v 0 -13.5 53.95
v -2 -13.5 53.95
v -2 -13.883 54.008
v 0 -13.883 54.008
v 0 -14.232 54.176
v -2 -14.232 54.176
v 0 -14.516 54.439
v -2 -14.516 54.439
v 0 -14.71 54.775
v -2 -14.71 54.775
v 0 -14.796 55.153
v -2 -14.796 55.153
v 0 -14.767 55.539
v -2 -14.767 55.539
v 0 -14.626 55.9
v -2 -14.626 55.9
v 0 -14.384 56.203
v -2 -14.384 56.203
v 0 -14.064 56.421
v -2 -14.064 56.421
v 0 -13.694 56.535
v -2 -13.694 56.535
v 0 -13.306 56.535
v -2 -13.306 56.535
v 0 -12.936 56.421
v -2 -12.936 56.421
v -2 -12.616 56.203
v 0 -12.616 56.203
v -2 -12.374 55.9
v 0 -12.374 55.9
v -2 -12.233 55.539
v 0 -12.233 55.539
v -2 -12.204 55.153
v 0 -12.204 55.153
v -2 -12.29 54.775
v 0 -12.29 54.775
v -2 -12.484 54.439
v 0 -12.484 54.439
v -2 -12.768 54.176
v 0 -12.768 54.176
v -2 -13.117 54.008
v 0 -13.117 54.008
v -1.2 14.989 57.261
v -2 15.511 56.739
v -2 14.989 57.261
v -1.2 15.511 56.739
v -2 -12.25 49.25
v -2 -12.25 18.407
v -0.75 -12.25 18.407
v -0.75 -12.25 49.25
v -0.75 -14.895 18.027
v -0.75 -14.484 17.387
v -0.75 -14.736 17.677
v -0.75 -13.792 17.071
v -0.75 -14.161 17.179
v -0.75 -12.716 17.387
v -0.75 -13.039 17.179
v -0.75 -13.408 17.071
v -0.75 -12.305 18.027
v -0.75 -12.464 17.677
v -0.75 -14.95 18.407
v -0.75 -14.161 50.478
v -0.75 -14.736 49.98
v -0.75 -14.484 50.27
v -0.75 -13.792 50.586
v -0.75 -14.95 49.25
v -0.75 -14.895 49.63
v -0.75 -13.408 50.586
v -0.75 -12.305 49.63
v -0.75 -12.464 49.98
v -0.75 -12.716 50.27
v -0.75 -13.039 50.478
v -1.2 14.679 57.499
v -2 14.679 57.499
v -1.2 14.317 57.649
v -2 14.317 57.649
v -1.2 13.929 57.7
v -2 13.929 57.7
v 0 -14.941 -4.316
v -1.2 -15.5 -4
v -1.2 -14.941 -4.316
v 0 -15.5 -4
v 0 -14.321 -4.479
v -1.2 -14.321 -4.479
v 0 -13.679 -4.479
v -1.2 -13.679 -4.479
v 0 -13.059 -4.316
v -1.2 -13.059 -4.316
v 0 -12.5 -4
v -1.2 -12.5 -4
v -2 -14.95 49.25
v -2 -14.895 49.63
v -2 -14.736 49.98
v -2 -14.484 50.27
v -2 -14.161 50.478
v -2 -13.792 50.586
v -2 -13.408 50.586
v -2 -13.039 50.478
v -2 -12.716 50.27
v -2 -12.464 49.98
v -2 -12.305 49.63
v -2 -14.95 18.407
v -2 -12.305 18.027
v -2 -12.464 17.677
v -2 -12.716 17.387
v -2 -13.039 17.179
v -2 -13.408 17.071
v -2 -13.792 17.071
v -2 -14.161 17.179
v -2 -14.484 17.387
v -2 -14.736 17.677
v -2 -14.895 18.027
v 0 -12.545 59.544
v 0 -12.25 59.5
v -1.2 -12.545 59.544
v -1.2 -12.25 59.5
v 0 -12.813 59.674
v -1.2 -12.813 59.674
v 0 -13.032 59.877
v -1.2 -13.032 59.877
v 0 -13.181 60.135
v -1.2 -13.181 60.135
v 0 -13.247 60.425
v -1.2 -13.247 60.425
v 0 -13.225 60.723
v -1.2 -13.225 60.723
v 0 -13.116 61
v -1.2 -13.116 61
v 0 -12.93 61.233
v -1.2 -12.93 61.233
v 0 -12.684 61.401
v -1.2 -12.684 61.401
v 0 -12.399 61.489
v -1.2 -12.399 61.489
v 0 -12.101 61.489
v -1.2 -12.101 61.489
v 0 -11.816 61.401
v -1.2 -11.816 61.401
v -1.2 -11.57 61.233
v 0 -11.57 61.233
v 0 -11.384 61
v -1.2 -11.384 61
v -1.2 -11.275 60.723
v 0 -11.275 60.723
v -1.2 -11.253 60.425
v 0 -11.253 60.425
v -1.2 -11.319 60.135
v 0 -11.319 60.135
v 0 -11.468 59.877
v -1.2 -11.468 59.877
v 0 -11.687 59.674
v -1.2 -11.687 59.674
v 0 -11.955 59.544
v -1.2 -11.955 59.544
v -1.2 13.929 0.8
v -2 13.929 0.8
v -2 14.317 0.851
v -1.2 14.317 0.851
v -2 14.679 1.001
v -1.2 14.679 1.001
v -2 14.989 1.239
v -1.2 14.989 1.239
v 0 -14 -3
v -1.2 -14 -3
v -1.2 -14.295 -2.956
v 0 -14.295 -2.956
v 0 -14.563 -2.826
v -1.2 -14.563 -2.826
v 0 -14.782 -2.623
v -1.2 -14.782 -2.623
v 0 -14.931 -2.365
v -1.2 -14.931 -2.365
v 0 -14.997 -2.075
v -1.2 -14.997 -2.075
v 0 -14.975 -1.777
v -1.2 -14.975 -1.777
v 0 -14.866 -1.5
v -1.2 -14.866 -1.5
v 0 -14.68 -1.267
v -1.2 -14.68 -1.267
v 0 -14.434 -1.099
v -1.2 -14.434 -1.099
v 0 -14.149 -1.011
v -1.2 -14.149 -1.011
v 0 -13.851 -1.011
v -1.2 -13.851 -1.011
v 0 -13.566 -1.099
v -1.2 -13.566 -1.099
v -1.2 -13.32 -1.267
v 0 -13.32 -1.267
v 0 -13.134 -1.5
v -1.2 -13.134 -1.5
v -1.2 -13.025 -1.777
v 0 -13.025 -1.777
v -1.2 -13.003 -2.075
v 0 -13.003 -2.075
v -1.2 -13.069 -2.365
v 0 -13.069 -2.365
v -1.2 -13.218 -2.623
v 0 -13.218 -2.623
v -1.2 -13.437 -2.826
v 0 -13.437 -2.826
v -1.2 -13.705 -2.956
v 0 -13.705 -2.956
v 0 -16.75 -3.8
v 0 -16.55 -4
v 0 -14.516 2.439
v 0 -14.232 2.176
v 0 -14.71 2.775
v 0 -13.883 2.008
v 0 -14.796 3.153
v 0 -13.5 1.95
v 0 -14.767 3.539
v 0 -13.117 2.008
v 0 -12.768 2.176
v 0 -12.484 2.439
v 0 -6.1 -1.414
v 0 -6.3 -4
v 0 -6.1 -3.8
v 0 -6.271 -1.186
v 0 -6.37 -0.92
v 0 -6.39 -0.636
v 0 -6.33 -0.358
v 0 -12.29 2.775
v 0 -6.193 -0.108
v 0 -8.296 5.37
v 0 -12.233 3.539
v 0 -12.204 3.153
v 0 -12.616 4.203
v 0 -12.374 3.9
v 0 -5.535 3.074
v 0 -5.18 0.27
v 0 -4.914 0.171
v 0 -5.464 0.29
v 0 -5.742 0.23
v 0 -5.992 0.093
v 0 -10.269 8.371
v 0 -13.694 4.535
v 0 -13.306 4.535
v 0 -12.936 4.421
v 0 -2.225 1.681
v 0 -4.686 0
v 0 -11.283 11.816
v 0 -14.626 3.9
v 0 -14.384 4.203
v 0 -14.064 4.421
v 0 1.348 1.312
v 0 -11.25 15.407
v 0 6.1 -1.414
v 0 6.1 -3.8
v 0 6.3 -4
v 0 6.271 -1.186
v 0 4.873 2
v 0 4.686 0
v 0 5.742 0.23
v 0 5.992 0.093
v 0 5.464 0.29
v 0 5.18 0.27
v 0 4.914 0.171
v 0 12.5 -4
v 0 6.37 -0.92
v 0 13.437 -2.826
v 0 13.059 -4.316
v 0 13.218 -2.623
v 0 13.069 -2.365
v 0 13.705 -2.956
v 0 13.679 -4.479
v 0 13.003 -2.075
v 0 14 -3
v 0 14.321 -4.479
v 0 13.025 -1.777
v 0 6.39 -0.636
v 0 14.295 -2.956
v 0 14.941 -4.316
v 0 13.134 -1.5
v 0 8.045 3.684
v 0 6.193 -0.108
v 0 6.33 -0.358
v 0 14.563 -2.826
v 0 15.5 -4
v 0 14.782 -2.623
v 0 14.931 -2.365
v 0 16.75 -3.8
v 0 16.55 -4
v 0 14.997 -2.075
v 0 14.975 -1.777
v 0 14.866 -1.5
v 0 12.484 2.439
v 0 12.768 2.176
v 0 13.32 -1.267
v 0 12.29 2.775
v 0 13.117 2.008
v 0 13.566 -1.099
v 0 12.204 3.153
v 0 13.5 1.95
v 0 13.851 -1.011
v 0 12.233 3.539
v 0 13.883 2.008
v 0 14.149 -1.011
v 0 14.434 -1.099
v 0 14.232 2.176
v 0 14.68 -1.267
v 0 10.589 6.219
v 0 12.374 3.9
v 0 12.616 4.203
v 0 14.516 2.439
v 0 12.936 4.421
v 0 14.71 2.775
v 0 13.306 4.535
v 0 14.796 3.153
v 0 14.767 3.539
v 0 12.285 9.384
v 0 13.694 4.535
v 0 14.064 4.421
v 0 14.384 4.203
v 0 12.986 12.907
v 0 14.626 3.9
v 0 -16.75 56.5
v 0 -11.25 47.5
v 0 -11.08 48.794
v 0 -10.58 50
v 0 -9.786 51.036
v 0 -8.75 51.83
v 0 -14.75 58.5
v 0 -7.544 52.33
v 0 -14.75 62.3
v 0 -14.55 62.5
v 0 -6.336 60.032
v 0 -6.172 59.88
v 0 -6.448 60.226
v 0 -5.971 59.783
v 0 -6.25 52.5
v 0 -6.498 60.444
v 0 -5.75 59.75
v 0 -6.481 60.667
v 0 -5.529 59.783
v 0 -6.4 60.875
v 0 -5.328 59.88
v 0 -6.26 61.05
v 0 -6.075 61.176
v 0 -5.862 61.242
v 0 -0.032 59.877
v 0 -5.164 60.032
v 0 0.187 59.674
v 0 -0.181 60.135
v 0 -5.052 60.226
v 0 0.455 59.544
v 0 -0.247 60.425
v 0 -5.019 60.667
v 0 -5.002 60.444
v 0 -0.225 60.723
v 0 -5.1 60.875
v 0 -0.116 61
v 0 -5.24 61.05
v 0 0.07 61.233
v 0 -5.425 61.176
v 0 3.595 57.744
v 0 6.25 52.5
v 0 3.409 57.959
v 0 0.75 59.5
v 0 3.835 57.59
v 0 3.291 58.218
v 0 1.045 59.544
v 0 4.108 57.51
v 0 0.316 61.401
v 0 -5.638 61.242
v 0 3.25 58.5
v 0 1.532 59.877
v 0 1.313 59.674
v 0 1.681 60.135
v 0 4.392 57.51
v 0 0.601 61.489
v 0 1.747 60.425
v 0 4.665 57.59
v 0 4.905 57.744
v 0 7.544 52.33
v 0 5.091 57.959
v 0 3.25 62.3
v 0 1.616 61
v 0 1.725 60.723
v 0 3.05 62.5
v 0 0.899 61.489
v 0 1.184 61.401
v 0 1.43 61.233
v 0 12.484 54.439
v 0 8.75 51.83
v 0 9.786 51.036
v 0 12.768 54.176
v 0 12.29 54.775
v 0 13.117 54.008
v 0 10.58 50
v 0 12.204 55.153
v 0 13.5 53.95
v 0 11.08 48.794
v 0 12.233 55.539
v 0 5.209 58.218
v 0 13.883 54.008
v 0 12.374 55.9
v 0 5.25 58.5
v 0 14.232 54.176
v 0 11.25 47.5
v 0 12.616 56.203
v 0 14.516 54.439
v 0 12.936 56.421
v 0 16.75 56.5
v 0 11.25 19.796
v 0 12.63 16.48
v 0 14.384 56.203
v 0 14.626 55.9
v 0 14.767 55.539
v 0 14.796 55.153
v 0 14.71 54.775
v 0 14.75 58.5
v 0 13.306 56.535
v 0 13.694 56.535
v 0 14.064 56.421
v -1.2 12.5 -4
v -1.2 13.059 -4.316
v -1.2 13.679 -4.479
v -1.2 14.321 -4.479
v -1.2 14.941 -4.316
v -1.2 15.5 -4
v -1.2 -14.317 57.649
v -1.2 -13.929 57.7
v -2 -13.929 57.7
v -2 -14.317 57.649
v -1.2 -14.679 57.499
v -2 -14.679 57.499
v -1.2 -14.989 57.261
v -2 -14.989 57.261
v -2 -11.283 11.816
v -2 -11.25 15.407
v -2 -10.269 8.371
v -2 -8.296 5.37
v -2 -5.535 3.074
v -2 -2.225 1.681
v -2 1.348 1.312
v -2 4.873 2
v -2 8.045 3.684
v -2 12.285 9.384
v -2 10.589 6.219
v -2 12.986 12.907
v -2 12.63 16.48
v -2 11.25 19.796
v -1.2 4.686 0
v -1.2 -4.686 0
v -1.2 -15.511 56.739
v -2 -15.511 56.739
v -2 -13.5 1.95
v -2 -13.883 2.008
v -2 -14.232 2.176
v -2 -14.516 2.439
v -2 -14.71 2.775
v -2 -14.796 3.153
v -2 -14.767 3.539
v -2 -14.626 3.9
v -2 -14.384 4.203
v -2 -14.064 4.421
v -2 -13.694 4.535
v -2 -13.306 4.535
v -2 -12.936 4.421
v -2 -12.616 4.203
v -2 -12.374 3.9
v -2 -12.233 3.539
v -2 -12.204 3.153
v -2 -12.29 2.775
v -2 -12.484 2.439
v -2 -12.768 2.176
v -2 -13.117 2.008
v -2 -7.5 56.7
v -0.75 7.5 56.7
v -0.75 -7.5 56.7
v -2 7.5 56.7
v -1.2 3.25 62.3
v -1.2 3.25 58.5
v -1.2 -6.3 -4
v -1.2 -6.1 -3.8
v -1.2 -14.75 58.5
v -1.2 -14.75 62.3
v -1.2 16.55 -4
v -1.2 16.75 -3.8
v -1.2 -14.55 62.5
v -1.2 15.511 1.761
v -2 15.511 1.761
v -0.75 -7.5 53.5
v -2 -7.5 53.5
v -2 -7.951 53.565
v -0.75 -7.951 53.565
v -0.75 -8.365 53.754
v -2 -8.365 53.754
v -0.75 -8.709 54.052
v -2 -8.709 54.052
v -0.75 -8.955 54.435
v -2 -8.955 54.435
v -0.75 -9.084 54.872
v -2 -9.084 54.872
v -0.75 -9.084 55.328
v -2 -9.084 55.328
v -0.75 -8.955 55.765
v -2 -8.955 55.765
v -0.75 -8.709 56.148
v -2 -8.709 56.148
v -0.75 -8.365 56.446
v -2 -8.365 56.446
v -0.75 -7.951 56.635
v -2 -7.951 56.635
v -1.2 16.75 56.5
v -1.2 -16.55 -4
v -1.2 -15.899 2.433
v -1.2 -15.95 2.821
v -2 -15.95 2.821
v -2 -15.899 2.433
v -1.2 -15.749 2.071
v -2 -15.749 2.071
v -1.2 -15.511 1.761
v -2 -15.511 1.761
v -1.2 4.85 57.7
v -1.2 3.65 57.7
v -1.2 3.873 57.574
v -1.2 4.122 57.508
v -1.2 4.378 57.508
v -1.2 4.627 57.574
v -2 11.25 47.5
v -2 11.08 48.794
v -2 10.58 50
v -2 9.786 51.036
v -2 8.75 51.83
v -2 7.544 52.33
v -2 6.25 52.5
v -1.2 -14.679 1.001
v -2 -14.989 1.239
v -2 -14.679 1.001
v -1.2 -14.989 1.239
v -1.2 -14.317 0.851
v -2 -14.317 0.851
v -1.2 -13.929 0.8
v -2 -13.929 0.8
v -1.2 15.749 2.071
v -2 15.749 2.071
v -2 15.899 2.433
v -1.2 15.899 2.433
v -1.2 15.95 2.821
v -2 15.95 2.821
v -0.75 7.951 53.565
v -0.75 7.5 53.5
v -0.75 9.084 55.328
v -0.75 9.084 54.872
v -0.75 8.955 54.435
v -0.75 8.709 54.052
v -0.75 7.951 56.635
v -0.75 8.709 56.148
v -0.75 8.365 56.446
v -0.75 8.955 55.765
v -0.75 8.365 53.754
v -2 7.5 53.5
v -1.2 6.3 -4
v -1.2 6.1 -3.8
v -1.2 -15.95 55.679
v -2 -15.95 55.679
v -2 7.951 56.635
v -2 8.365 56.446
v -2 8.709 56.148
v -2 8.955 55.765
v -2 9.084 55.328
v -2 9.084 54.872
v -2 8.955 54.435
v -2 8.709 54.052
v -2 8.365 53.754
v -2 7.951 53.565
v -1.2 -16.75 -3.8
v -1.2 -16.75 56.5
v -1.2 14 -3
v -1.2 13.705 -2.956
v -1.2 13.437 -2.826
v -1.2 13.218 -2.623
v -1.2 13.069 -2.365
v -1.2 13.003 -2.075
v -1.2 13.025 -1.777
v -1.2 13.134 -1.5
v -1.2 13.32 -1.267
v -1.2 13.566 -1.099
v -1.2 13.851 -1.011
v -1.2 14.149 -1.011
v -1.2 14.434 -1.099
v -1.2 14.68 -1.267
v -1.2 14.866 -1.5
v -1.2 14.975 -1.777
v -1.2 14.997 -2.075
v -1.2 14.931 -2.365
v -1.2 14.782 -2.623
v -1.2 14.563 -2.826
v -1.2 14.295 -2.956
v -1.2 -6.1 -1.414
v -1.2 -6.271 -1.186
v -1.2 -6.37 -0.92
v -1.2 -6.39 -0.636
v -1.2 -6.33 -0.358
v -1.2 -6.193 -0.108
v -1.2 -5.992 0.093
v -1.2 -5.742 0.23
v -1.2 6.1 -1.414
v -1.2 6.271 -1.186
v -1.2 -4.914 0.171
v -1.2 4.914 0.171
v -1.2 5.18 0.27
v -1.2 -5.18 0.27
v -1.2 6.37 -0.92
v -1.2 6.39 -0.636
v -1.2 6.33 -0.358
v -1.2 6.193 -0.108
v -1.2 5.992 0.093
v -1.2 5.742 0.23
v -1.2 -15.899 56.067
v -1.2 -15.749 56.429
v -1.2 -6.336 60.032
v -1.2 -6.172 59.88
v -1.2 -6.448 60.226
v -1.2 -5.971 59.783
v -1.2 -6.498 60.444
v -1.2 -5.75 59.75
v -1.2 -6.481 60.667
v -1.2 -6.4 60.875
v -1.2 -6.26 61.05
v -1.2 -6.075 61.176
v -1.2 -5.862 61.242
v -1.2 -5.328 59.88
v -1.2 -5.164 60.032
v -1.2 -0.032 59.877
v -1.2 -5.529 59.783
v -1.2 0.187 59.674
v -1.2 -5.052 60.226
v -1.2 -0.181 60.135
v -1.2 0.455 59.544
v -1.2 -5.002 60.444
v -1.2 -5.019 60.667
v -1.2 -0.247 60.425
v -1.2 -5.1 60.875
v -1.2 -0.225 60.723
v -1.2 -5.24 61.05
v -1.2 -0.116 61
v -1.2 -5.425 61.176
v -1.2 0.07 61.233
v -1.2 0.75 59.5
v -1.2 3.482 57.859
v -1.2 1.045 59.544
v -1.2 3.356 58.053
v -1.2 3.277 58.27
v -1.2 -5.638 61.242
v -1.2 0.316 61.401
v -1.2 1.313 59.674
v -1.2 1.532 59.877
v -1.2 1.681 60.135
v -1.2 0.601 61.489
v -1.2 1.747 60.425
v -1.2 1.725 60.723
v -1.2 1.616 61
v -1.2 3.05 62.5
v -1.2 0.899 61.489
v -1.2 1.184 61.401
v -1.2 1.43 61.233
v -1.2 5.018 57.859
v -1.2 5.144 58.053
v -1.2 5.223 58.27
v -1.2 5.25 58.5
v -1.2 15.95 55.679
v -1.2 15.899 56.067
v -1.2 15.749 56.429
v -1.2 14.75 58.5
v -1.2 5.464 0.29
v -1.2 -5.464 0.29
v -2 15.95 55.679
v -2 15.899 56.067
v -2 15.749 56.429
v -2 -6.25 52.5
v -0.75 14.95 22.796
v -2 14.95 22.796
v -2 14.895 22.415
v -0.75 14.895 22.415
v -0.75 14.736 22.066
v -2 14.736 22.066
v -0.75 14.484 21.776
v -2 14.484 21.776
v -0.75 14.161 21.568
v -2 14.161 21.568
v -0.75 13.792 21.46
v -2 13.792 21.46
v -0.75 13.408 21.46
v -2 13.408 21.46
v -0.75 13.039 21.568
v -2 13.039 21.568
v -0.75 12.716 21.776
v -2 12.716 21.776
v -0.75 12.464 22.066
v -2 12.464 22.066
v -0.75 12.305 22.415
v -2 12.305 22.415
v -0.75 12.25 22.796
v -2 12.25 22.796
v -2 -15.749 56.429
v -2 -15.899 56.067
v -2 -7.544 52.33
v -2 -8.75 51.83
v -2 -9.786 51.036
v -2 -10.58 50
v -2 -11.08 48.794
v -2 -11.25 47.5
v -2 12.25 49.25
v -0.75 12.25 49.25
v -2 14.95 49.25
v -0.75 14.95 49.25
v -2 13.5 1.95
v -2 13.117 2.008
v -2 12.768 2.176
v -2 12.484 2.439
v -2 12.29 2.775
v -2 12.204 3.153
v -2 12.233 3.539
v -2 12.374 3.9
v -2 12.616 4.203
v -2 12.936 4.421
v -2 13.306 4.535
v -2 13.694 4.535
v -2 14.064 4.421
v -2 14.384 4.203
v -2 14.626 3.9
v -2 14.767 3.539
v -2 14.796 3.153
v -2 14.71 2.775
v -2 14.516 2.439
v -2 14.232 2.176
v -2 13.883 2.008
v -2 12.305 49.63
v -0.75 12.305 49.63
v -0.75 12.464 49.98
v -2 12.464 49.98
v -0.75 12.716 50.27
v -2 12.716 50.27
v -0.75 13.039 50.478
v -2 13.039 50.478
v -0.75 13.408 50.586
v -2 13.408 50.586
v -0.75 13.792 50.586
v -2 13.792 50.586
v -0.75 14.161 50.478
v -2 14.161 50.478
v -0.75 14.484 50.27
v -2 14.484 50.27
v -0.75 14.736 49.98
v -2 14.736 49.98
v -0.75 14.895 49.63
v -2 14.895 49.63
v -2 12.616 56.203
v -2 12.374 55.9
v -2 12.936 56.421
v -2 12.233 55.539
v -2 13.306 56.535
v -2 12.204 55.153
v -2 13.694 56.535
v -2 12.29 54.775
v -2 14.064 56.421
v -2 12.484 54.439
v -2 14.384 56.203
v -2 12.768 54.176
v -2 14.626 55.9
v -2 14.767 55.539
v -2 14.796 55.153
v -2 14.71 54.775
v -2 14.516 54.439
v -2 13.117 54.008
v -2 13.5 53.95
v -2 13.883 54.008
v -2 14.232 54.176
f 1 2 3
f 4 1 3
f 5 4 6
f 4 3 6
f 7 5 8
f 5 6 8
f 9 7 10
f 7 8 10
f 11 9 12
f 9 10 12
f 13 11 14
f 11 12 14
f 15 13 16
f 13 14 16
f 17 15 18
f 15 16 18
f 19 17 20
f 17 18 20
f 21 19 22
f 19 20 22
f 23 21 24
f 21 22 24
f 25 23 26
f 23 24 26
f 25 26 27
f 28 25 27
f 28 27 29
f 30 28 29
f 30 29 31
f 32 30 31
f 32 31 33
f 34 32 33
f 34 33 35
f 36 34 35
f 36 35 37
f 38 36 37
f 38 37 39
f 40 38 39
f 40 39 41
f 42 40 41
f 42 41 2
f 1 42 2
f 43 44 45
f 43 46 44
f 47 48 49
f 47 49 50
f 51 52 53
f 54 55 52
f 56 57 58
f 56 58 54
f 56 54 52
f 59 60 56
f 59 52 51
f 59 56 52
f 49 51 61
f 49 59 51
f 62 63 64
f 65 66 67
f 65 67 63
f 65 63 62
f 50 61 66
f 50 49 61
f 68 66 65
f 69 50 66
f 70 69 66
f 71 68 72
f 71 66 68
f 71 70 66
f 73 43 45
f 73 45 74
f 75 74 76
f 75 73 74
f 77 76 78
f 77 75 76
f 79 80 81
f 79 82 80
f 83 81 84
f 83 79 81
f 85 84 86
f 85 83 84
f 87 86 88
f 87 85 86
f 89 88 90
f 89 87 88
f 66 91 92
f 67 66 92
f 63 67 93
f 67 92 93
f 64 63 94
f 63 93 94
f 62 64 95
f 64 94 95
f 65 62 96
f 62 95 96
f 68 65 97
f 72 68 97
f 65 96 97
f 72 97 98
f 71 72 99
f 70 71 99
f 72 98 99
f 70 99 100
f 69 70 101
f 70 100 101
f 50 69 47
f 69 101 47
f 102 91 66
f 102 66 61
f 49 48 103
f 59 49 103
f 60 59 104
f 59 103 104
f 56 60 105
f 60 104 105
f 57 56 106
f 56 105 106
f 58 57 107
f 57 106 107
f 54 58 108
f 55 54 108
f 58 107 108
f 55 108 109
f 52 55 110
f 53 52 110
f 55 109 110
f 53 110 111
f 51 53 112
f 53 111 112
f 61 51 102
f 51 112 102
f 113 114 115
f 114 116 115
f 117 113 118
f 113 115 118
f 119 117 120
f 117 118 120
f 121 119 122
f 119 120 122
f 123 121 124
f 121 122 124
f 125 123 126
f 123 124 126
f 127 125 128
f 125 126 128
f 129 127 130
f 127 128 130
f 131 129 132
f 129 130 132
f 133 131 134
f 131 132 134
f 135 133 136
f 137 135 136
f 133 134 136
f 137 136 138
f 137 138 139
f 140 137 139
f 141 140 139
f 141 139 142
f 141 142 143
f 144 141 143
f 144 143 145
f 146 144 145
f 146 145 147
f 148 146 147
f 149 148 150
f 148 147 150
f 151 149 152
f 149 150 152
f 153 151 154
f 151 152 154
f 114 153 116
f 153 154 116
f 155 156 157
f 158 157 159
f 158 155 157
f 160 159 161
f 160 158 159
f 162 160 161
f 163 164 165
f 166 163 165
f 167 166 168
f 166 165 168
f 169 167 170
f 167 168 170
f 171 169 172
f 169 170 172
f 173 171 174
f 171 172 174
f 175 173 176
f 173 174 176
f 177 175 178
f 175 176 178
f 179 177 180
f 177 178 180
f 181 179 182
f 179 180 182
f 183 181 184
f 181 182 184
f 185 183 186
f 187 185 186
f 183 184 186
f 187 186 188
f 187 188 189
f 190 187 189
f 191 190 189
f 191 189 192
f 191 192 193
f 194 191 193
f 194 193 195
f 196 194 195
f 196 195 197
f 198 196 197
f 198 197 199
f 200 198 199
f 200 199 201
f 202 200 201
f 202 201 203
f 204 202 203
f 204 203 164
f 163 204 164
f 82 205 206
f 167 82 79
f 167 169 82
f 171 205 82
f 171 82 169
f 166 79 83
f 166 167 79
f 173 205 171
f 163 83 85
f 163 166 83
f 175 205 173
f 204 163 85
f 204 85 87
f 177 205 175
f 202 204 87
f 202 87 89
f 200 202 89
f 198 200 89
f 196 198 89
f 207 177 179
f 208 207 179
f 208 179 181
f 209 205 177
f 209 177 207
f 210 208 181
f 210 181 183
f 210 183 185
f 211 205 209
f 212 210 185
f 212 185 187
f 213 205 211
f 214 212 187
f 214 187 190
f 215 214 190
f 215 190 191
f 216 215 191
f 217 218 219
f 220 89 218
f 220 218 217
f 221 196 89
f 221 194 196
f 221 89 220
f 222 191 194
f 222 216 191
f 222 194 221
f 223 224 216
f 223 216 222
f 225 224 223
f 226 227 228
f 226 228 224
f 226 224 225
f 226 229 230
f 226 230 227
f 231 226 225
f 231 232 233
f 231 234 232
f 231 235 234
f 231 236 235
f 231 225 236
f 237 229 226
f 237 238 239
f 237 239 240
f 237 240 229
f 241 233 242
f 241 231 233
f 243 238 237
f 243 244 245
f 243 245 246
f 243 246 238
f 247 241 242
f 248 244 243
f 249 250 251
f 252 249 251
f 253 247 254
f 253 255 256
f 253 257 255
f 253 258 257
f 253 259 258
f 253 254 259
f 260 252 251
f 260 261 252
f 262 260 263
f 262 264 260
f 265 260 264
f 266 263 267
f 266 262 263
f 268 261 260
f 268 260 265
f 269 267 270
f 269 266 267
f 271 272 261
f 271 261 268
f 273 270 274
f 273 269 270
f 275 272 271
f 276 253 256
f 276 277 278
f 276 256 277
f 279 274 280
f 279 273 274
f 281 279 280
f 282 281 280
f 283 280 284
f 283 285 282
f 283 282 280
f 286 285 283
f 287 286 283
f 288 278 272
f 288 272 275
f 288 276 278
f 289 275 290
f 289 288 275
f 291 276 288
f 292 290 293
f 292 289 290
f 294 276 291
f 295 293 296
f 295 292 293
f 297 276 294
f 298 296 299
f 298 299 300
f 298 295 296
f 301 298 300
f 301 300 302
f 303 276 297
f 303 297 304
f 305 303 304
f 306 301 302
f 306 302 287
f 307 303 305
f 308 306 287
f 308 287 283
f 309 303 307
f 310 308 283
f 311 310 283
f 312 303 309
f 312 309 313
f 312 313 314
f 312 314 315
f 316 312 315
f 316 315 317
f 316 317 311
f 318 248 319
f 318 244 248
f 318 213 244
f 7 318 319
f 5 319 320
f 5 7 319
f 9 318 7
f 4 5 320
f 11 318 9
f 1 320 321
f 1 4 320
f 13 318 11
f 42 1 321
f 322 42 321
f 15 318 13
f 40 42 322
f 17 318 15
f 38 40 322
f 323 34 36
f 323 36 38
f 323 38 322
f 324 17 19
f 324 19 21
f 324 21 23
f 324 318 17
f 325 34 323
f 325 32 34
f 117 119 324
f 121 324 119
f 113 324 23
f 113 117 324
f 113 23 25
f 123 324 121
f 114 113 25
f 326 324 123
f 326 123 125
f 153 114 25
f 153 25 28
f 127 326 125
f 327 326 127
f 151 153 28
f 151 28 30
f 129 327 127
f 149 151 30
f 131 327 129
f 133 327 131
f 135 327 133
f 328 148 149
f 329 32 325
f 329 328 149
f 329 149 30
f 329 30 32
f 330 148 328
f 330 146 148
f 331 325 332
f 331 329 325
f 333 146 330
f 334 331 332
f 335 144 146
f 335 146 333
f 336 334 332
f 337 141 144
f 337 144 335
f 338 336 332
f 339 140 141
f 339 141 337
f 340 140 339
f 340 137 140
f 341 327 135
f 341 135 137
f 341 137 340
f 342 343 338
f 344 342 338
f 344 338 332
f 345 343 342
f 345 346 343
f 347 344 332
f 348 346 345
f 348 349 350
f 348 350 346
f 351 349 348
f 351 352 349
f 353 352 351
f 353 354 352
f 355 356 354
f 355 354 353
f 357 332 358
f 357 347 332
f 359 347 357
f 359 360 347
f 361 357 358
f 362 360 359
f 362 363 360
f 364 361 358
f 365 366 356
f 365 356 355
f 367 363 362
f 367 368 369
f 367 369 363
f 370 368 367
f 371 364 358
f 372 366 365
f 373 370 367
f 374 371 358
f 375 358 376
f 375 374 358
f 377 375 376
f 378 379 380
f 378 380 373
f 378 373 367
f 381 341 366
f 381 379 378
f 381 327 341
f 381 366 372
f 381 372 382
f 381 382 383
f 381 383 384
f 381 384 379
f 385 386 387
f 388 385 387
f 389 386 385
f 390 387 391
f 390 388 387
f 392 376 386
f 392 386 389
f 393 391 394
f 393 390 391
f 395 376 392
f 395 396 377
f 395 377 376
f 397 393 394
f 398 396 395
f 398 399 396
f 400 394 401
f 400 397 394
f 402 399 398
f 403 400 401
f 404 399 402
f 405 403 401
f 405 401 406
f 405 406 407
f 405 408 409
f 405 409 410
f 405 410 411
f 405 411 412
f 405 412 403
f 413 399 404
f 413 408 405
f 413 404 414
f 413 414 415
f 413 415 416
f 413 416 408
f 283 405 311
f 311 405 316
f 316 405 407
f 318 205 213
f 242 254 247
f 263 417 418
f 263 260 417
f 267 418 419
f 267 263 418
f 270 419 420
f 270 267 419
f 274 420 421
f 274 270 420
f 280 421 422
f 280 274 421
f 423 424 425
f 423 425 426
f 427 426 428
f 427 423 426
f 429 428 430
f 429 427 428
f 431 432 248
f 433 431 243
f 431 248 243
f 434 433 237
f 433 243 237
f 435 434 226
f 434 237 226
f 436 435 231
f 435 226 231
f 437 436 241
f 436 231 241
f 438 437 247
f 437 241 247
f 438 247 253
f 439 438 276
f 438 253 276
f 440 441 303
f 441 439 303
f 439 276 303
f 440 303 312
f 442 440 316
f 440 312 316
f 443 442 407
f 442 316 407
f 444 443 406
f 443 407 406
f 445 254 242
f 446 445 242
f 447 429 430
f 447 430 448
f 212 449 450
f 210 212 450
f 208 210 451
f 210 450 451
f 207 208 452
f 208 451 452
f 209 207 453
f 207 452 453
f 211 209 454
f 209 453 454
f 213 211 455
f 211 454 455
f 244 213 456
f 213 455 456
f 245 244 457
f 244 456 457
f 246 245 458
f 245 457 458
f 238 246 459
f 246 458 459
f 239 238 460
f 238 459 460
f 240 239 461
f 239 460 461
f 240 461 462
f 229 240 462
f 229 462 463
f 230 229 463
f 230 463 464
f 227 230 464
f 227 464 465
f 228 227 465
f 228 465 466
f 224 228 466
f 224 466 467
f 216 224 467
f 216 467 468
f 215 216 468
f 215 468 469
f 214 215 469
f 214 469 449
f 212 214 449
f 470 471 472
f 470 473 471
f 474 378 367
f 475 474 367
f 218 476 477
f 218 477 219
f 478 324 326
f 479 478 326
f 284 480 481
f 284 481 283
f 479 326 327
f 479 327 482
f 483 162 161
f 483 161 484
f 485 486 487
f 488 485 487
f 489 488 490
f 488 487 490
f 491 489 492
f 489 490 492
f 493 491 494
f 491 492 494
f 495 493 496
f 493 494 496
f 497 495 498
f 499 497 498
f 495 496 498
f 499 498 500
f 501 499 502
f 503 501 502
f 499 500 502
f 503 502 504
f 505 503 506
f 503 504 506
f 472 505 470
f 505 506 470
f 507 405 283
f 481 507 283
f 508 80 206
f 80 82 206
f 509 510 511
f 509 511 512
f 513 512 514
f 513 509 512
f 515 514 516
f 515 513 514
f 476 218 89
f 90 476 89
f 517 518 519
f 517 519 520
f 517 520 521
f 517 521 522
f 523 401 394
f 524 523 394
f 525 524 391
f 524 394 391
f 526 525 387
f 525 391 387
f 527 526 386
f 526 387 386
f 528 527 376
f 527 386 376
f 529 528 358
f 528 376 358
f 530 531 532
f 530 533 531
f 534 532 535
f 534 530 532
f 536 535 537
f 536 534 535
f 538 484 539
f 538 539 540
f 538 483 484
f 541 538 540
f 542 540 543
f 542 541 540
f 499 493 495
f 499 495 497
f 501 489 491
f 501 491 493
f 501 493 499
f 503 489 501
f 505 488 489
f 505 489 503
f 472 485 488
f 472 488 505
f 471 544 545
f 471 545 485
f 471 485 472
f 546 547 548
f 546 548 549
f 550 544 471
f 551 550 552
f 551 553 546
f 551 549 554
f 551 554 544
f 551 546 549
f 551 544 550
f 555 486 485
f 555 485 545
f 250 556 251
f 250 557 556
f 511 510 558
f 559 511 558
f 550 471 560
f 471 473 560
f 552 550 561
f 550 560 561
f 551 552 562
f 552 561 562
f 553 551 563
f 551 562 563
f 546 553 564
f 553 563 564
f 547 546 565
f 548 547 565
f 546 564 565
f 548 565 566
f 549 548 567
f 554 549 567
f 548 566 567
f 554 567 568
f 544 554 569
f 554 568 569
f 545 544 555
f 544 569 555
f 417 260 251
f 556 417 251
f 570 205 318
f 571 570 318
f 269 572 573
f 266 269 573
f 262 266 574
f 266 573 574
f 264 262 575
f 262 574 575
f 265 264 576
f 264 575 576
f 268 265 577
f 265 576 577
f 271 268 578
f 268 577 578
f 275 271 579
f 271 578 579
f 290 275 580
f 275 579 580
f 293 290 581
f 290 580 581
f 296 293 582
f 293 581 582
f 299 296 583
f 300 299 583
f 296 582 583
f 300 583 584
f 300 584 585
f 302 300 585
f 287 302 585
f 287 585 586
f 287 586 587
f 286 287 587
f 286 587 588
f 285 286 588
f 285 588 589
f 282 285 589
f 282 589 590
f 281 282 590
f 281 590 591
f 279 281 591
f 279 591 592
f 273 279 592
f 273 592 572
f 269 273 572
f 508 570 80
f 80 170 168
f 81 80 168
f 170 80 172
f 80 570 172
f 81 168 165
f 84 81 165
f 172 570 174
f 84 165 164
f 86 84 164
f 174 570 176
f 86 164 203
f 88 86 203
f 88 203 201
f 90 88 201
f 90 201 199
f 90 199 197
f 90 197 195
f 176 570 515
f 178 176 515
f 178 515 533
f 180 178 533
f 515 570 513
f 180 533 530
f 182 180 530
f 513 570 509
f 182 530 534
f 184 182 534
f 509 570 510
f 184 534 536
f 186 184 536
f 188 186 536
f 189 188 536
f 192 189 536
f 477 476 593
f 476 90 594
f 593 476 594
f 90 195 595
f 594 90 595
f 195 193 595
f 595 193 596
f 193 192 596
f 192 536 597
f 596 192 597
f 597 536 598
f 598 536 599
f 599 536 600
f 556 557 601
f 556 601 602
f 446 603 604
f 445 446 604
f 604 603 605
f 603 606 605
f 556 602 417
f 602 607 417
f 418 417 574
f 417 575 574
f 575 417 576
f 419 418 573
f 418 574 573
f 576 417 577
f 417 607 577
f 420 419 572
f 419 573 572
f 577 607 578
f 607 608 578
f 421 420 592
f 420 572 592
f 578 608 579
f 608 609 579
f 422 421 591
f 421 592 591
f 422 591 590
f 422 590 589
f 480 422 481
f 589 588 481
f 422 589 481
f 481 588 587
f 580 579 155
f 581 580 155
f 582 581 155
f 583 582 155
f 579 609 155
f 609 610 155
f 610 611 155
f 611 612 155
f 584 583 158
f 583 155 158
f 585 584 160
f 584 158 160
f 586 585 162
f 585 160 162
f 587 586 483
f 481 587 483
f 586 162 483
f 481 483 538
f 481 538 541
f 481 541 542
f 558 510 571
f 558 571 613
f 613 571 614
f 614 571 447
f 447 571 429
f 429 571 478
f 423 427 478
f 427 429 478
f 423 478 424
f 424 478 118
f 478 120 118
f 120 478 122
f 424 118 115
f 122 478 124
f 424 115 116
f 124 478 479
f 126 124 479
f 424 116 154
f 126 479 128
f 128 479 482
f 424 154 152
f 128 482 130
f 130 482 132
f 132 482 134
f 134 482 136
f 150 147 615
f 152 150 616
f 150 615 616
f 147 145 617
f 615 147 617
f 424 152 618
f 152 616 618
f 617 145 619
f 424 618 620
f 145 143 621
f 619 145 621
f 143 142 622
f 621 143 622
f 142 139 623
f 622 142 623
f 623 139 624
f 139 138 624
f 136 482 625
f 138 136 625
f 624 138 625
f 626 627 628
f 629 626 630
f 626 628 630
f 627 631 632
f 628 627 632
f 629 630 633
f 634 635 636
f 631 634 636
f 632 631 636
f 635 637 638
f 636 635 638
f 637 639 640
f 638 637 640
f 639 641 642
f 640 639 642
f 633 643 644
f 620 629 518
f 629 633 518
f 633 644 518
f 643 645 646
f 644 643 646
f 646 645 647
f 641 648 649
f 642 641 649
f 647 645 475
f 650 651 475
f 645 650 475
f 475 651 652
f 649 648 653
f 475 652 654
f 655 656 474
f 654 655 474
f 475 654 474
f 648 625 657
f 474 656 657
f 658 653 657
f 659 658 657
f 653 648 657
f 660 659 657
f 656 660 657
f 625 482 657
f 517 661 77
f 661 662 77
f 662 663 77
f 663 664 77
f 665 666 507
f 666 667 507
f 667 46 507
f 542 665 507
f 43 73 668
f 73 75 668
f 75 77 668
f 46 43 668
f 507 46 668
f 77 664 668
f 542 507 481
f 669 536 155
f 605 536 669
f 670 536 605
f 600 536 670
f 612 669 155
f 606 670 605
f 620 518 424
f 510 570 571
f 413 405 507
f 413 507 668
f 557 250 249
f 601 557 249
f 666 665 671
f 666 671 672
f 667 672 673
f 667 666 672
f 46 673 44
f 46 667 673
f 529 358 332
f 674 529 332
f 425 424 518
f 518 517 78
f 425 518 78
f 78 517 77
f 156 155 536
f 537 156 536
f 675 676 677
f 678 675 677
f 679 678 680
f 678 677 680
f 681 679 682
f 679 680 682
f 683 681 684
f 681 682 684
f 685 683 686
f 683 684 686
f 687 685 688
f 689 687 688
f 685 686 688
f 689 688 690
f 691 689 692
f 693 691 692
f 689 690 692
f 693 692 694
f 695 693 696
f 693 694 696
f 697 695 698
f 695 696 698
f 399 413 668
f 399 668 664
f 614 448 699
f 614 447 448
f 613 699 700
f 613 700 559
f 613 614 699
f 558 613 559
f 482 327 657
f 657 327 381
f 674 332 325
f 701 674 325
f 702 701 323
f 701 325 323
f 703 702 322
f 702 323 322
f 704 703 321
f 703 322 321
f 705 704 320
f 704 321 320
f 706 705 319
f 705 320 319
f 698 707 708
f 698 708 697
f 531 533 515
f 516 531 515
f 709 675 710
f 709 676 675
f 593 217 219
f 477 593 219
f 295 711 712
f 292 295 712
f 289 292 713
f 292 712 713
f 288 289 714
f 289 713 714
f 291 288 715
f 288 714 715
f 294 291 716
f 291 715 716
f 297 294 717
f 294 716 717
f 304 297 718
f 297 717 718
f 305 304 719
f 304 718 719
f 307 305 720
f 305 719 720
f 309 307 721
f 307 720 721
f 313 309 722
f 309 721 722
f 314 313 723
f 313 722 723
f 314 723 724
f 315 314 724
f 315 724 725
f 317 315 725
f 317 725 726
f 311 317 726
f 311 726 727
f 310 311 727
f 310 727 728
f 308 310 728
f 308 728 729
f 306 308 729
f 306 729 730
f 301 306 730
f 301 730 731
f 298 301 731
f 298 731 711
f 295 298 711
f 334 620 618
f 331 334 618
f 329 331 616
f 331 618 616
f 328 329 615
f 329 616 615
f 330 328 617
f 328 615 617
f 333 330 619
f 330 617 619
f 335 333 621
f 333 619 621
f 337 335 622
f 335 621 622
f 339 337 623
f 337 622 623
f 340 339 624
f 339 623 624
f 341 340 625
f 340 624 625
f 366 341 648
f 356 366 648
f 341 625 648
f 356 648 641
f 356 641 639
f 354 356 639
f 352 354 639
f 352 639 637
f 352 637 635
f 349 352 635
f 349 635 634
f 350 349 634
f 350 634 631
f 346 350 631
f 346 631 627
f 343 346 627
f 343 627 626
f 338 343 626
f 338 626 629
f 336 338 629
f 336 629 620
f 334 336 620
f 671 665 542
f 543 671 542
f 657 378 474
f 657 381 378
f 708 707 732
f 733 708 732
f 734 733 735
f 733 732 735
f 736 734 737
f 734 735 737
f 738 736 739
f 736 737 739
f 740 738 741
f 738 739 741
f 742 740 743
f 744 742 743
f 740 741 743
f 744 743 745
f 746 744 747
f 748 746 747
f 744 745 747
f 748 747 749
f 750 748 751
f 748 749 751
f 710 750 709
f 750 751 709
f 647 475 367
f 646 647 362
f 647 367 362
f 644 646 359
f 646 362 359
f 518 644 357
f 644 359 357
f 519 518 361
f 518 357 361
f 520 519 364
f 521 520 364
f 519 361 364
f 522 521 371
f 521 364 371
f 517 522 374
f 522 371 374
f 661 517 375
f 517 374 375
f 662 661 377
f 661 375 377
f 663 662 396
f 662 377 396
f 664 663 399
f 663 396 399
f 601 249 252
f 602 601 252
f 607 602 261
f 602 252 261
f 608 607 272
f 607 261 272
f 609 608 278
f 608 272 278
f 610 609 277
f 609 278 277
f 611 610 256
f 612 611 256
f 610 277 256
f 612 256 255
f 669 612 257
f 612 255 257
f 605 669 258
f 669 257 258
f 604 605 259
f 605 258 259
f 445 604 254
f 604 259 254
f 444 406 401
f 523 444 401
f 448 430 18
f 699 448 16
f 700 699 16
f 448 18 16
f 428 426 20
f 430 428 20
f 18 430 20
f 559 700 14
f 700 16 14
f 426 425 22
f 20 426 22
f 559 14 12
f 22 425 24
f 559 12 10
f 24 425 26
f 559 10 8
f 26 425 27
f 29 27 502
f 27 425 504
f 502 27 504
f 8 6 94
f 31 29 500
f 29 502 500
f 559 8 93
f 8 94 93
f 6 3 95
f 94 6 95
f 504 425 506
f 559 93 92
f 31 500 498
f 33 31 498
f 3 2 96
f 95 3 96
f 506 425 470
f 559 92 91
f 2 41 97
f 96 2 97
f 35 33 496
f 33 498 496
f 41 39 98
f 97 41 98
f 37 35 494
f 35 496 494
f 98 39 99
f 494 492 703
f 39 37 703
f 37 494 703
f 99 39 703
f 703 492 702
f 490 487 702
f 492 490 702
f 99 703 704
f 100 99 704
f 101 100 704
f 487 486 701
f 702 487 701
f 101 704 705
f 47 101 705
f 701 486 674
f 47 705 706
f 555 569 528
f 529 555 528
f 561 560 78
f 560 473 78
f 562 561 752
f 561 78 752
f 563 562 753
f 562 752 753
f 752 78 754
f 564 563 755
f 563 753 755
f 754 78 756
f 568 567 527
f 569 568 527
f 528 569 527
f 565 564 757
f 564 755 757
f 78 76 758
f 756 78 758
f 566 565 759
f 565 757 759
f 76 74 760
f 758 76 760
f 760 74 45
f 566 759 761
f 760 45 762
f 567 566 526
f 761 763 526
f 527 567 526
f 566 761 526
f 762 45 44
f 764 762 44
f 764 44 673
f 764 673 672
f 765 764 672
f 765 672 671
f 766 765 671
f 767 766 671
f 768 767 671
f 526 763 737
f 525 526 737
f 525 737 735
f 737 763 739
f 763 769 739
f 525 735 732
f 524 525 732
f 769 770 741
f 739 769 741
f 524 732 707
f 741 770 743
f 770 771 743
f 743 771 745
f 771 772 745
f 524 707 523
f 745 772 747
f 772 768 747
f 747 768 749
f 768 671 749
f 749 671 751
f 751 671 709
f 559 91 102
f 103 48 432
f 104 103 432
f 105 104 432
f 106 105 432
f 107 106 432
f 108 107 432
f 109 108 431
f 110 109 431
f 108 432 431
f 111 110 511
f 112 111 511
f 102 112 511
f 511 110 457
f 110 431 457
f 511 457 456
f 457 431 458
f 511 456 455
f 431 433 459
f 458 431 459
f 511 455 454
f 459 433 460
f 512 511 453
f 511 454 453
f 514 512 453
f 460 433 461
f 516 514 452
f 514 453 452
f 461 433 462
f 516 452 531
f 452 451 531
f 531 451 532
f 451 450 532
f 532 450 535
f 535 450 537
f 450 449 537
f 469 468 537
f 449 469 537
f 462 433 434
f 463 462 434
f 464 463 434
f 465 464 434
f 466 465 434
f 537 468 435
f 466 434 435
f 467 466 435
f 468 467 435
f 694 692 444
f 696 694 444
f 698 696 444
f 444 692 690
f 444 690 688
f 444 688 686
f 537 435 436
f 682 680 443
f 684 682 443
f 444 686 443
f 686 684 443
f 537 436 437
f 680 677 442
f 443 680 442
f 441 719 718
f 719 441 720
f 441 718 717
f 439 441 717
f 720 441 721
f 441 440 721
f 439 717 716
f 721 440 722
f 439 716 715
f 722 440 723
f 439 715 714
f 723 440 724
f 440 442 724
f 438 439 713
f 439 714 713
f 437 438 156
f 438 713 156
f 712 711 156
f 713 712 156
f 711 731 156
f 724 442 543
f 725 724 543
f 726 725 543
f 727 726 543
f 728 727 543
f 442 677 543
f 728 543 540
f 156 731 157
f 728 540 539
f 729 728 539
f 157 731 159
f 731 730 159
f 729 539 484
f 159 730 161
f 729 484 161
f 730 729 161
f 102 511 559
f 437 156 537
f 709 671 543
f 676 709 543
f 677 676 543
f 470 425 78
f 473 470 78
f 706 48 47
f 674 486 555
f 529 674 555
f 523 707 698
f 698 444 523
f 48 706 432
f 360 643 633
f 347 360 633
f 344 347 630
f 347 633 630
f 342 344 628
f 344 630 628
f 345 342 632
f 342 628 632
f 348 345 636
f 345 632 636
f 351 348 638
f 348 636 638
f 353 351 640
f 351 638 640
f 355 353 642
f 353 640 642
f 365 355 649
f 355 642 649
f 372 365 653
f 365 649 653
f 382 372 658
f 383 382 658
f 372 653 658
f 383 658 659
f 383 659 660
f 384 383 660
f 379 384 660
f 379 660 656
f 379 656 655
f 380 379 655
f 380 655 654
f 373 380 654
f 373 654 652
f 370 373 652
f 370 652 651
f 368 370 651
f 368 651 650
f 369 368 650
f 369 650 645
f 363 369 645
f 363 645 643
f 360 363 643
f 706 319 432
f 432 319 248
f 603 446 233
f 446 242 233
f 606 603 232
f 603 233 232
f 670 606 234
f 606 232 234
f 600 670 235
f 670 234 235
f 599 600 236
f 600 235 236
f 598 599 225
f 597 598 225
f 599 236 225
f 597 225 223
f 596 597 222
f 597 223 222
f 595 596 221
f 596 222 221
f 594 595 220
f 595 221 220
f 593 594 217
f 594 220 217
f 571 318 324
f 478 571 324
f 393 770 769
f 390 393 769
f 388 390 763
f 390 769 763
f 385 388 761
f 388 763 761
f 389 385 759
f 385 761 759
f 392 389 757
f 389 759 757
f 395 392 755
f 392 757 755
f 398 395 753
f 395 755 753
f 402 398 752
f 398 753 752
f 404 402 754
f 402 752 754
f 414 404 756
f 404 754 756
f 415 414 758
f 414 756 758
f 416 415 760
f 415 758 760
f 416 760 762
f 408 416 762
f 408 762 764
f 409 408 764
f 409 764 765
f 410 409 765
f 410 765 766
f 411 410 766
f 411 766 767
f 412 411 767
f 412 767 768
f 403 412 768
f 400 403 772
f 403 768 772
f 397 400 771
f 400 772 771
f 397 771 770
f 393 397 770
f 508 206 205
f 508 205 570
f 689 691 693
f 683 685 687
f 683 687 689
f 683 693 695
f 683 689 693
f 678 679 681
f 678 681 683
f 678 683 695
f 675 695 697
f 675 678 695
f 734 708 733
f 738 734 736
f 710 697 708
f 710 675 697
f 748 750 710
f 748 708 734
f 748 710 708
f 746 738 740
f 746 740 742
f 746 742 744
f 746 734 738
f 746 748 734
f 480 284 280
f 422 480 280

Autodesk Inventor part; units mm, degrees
ref_plane "YZ Plane" through (0, 0, 0) normal (1, 0, 0) x (0, 1, 0)
ref_plane "XZ Plane" through (0, 0, 0) normal (0, 1, 0) x (-1, 0, 0)
ref_plane "XY Plane" through (0, 0, 0) normal (0, 0, 1) x (1, 0, 0)
sketch "スケッチ1" plane through (0, 0, 0) normal (1, 0, 0) x (0, 1, 0)
  line L0 (0, 0) -> (0, 58.5) construction
  line L1 (16.75, 56.5) -> (16.75, -4)
  line L2 (16.75, -4) -> (15.5, -4)
  line L3 (6.1, -4) -> (6.1, -1.4142)
  line L4 (5.714, 0) -> (4.6858, 0) construction
  line L5 (4.6858, 0) -> (-4.6858, 0)
  line L6 (-6.1, 0) -> (-6.1, -1.4142) construction
  line L7 (-6.1, -4) -> (-12.5, -4)
  line L8 (-16.75, -4) -> (-16.75, 56.5)
  arc A0 (-4.6858, 0) -> (-6.1, -1.4142) centre (-5.3929, -0.7071) ccw
  line L9 (14.75, 58.5) -> (5.25, 58.5)
  line L10 (16.75, 56.5) -> (14.75, 58.5)
  line L11 (-16.75, 56.5) -> (-14.75, 58.5)
  line L12 (13.5, 55.25) -> (-13.5, 55.25) construction
  line L13 (-13.5, 55.25) -> (-13.5, 3.25) construction
  line L14 (-13.5, 3.25) -> (13.5, 3.25) construction
  line L15 (13.5, 3.25) -> (13.5, 55.25) construction
  line L16 (0, 29.25) -> (21.0927, 29.25) construction
  line L17 (14, -2) -> (-14, -2) construction
  arc A1 (12.5, -4) -> (15.5, -4) centre (14, -2) ccw
  line L18 (15.5, -4) -> (12.5, -4) construction
  line L19 (12.5, -4) -> (6.1, -4)
  arc A2 (-15.5, -4) -> (-12.5, -4) centre (-14, -2) ccw
  line L20 (-12.5, -4) -> (-15.5, -4) construction
  line L21 (-15.5, -4) -> (-16.75, -4)
  line L22 (6.25, 52.5) -> (-6.25, 52.5)
  line L23 (-11.25, 47.5) -> (-11.25, 12)
  line L24 (-11.25, 12) -> (11.25, 12)
  line L25 (11.25, 12) -> (11.25, 47.5)
  arc A3 (11.25, 47.5) -> (6.25, 52.5) centre (6.25, 47.5) ccw
  arc A4 (-6.25, 52.5) -> (-11.25, 47.5) centre (-6.25, 47.5) ccw
  line L26 (6.1, -1.4142) -> (6.1, -0.7071) construction
  line L27 (-4.6858, 0) -> (-6.1, 0) construction
  line L28 (-6.1, -1.4142) -> (-6.1, -4)
  line L29 (6.1, -1.4142) -> (6.1, 0) construction
  line L30 (6.1, 0) -> (4.6858, 0) construction
  arc A5 (6.1, -1.4142) -> (4.6858, 0) centre (5.3929, -0.7071) ccw
  line L31 (-14.75, 58.5) -> (-14.75, 62.5)
  line L32 (-14.75, 62.5) -> (3.25, 62.5)
  line L33 (3.25, 62.5) -> (3.25, 58.5)
  arc A6 (3.25, 58.5) -> (5.25, 58.5) centre (4.25, 58.5) ccw
  line L34 (3.25, 58.5) -> (-14.75, 58.5) construction
  line L35 (5.25, 58.5) -> (3.25, 58.5) construction
  line L36 (0.75, 60.5) -> (-12.25, 60.5) construction
  point P0 (16.75, 58.5)
  point P1 (-6.0944, 0.0056)
  point P2 (-16.75, 58.5)
  point P3 (-5.75, 60.5)
  dimension "d3" = 12.2
  dimension "d5" = 33.5
  dimension "d6" = 4
  dimension "d7" = 58.5
  dimension "d8" = 2
  dimension "d9" = 2
  dimension "d10" = 2
  dimension "d11" = 2
  dimension "d12" = 27
  dimension "d13" = 52
  dimension "d14" = 2
  dimension "d15" = 28
  dimension "d16" = 2.5
  dimension "d33" = 5
  dimension "d34" = 5.5
  dimension "d35" = 6
  dimension "d36" = 12
  dimension "d37" = 1
  dimension "d60" = 1
  dimension "d61" = 18
  dimension "d62" = 4
  dimension "d63" = 2
  dimension "d64" = 2.5
  dimension "d65" = 2.5
extrude "押し出し1" add sketch "スケッチ1" against normal blind 1.2
sketch "スケッチ2" plane through (-1.2, 0, 0) normal (1, 0, 0) x (0, 0, -1)
  line L0 (-58.5, 14.75) -> (-58.5, -14.75) construction
  line L1 (-56.5, -16.75) -> (4, -16.75) construction
  line L2 (4, 16.75) -> (-56.5, 16.75) construction
  line L3 (0, -4.6858) -> (0, 4.6858) construction
  line L4 (-0.8, 13.9287) -> (-0.8, -13.9287)
  line L5 (-2.8213, -15.95) -> (-55.6787, -15.95)
  line L6 (-57.7, -13.9287) -> (-57.7, 13.9287)
  line L7 (-55.6787, 15.95) -> (-2.8213, 15.95)
  line L8 (-1.2393, -14.9893) -> (-1.7607, -15.5107)
  line L9 (-1.2393, 14.9893) -> (-1.7607, 15.5107)
  line L10 (-56.7393, 15.5107) -> (-57.2607, 14.9893)
  line L11 (-57.2607, -14.9893) -> (-56.7393, -15.5107)
  arc A0 (-1.2393, -14.9893) -> (-0.8, -13.9287) centre (-2.3, -13.9287) ccw
  arc A1 (-2.8213, -15.95) -> (-1.7607, -15.5107) centre (-2.8213, -14.45) ccw
  arc A2 (-56.7393, -15.5107) -> (-55.6787, -15.95) centre (-55.6787, -14.45) ccw
  arc A3 (-57.7, -13.9287) -> (-57.2607, -14.9893) centre (-56.2, -13.9287) ccw
  arc A4 (-55.6787, 15.95) -> (-56.7393, 15.5107) centre (-55.6787, 14.45) ccw
  arc A5 (-57.2607, 14.9893) -> (-57.7, 13.9287) centre (-56.2, 13.9287) ccw
  arc A6 (-1.7607, 15.5107) -> (-2.8213, 15.95) centre (-2.8213, 14.45) ccw
  arc A7 (-0.8, 13.9287) -> (-1.2393, 14.9893) centre (-2.3, 13.9287) ccw
  arc A8 (-52.5, -6.25) -> (-47.5, -11.25) centre (-47.5, -6.25) ccw projected
  line L12 (-12, -11.25) -> (-47.5, -11.25) projected
  line L13 (-12, 11.25) -> (-12, -11.25) projected
  line L14 (-47.5, 11.25) -> (-12, 11.25) projected
  arc A9 (-47.5, 11.25) -> (-52.5, 6.25) centre (-47.5, 6.25) ccw projected
  line L15 (-52.5, -6.25) -> (-52.5, 6.25) projected
  point P0 (0, 0)
  point P1 (-0.8, -14.55)
  point P2 (-2.2, -15.95)
  point P3 (-0.8, -15.95)
  point P4 (-0.8, 14.55)
  point P5 (-2.2, 15.95)
  point P6 (-0.8, 15.95)
  point P7 (-56.3, 15.95)
  point P8 (-57.7, 14.55)
  point P9 (-57.7, 15.95)
  point P10 (-57.7, -14.55)
  point P11 (-56.3, -15.95)
  point P12 (-57.7, -15.95)
  point P13 (52.5, -6.25)
  point P14 (47.5, -11.25)
  point P15 (47.5, 11.25)
  point P16 (52.5, 6.25)
  dimension "d38" = 1.4
  dimension "d39" = 1.4
  dimension "d40" = 1.4
  dimension "d41" = 1.4
  dimension "d42" = 1.4
  dimension "d43" = 1.4
  dimension "d44" = 1.4
  dimension "d45" = 1.4
  dimension "d46" = 1.5
  dimension "d48" = 0.8
  dimension "d50" = 0.8
  dimension "d53" = 0.8
  dimension "d54" = 0.8
extrude "押し出し2" add sketch "スケッチ2" against normal blind 0.8
hole "穴1" at (0, 13.5, 55.25) at (0, -13.5, 55.25) at (0, -13.5, 3.25) at (0, 13.5, 3.25) direction (-1, 0, 0) diameter 2.6 end through all clearance for "Countersunk Raised Head Screw ISO 2010/7047" size "M2.5" standard "ISO"
hole "穴2" at (0, 14, -2) at (0, -14, -2) at (0, -12.25, 60.5) at (0, 0.75, 60.5) direction (-1, 0, 0) diameter 2 end through all
sketch "スケッチ3" plane through (0, 0, 0) normal (1, 0, 0) x (0, 0, -1)
  circle A0 centre (-13.5, 0.8) radius 12.2
  line L0 (4, 16.75) -> (-56.5, 16.75) projected
  line L1 (0, -4.6858) -> (0, 4.6858) projected
  point P0 (0, 0)
  dimension "d55" = 24.4
  dimension "d56" = 15.95
  dimension "d57" = 13.5
extrude "押し出し3" cut sketch "スケッチ3" against normal blind 10
hole "穴3" at (0, -5.75, 60.5) direction (-1, 0, 0) diameter 1.5 end through all
sketch "スケッチ4" plane through (-2, 0, 0) normal (-1, 0, 0) x (0, 0, 1)
  line L0 (22.7958, 14.95) -> (49.25, 14.95)
  line L1 (49.25, 14.95) -> (49.25, 12.25) construction
  line L2 (49.25, 12.25) -> (22.7958, 12.25)
  line L3 (22.7958, 12.25) -> (22.7958, 14.95) construction
  line L4 (53.5, 7.5) -> (56.7, 7.5) construction
  line L5 (56.7, 7.5) -> (56.7, -7.5)
  line L6 (56.7, -7.5) -> (53.5, -7.5) construction
  line L7 (53.5, -7.5) -> (53.5, 7.5)
  line L8 (18.4072, -12.25) -> (49.25, -12.25)
  line L9 (49.25, -12.25) -> (49.25, -14.95) construction
  line L10 (49.25, -14.95) -> (18.4072, -14.95)
  line L11 (18.4072, -14.95) -> (18.4072, -12.25) construction
  arc A0 (22.7958, 14.95) -> (22.7958, 12.25) centre (22.7958, 13.6) ccw
  arc A1 (49.25, 12.25) -> (49.25, 14.95) centre (49.25, 13.6) ccw
  arc A2 (56.7, 7.5) -> (53.5, 7.5) centre (55.1, 7.5) ccw
  arc A3 (53.5, -7.5) -> (56.7, -7.5) centre (55.1, -7.5) ccw
  arc A4 (49.25, -14.95) -> (49.25, -12.25) centre (49.25, -13.6) ccw
  arc A5 (18.4072, -12.25) -> (18.4072, -14.95) centre (18.4072, -13.6) ccw
  line L12 (55.6787, 15.95) -> (2.8213, 15.95) construction
  line L13 (19.7958, 11.25) -> (47.5, 11.25) construction
  line L14 (52.5, 6.25) -> (52.5, -6.25) construction
  line L15 (57.7, -13.9287) -> (57.7, 13.9287) construction
  line L16 (47.5, -11.25) -> (15.4072, -11.25) construction
  line L17 (2.8213, -15.95) -> (55.6787, -15.95) construction
  circle A6 centre (55.25, -13.5) radius 1.3 construction
  circle A7 centre (55.25, 13.5) radius 1.3 construction
  point P0 (0, 0)
  dimension "d73" = 1
  dimension "d74" = 1
  dimension "d75" = 1.35
  dimension "d76" = 1
  dimension "d77" = 1
  dimension "d78" = 1.6
  dimension "d79" = 1
  dimension "d80" = 1
  dimension "d81" = 3
  dimension "d82" = 3
  dimension "d83" = 6
  dimension "d84" = 6
  dimension "d85" = 6
  dimension "d86" = 6
extrude "押し出し4" cut sketch "スケッチ4" against normal blind 1.25
chamfer "面取り1" distance 0.2 angle 45 6 edges at (-0.6, 16.75, -4) (-0.6, -16.75, -4) (-0.6, -6.1, -4) (-0.6, 6.1, -4) (-0.6, 3.25, 62.5) (-0.6, -14.75, 62.5)
equation "\"d9\" = d8"
equation "\"d11\" = d10"
equation "\"d40\" = d38"
equation "\"d41\" = d40"
equation "\"d42\" = d38"
equation "\"d43\" = d42"
equation "\"d44\" = d38"
equation "\"d45\" = d44"
properties part number "SERVO_BOTTOM_SPACER"
